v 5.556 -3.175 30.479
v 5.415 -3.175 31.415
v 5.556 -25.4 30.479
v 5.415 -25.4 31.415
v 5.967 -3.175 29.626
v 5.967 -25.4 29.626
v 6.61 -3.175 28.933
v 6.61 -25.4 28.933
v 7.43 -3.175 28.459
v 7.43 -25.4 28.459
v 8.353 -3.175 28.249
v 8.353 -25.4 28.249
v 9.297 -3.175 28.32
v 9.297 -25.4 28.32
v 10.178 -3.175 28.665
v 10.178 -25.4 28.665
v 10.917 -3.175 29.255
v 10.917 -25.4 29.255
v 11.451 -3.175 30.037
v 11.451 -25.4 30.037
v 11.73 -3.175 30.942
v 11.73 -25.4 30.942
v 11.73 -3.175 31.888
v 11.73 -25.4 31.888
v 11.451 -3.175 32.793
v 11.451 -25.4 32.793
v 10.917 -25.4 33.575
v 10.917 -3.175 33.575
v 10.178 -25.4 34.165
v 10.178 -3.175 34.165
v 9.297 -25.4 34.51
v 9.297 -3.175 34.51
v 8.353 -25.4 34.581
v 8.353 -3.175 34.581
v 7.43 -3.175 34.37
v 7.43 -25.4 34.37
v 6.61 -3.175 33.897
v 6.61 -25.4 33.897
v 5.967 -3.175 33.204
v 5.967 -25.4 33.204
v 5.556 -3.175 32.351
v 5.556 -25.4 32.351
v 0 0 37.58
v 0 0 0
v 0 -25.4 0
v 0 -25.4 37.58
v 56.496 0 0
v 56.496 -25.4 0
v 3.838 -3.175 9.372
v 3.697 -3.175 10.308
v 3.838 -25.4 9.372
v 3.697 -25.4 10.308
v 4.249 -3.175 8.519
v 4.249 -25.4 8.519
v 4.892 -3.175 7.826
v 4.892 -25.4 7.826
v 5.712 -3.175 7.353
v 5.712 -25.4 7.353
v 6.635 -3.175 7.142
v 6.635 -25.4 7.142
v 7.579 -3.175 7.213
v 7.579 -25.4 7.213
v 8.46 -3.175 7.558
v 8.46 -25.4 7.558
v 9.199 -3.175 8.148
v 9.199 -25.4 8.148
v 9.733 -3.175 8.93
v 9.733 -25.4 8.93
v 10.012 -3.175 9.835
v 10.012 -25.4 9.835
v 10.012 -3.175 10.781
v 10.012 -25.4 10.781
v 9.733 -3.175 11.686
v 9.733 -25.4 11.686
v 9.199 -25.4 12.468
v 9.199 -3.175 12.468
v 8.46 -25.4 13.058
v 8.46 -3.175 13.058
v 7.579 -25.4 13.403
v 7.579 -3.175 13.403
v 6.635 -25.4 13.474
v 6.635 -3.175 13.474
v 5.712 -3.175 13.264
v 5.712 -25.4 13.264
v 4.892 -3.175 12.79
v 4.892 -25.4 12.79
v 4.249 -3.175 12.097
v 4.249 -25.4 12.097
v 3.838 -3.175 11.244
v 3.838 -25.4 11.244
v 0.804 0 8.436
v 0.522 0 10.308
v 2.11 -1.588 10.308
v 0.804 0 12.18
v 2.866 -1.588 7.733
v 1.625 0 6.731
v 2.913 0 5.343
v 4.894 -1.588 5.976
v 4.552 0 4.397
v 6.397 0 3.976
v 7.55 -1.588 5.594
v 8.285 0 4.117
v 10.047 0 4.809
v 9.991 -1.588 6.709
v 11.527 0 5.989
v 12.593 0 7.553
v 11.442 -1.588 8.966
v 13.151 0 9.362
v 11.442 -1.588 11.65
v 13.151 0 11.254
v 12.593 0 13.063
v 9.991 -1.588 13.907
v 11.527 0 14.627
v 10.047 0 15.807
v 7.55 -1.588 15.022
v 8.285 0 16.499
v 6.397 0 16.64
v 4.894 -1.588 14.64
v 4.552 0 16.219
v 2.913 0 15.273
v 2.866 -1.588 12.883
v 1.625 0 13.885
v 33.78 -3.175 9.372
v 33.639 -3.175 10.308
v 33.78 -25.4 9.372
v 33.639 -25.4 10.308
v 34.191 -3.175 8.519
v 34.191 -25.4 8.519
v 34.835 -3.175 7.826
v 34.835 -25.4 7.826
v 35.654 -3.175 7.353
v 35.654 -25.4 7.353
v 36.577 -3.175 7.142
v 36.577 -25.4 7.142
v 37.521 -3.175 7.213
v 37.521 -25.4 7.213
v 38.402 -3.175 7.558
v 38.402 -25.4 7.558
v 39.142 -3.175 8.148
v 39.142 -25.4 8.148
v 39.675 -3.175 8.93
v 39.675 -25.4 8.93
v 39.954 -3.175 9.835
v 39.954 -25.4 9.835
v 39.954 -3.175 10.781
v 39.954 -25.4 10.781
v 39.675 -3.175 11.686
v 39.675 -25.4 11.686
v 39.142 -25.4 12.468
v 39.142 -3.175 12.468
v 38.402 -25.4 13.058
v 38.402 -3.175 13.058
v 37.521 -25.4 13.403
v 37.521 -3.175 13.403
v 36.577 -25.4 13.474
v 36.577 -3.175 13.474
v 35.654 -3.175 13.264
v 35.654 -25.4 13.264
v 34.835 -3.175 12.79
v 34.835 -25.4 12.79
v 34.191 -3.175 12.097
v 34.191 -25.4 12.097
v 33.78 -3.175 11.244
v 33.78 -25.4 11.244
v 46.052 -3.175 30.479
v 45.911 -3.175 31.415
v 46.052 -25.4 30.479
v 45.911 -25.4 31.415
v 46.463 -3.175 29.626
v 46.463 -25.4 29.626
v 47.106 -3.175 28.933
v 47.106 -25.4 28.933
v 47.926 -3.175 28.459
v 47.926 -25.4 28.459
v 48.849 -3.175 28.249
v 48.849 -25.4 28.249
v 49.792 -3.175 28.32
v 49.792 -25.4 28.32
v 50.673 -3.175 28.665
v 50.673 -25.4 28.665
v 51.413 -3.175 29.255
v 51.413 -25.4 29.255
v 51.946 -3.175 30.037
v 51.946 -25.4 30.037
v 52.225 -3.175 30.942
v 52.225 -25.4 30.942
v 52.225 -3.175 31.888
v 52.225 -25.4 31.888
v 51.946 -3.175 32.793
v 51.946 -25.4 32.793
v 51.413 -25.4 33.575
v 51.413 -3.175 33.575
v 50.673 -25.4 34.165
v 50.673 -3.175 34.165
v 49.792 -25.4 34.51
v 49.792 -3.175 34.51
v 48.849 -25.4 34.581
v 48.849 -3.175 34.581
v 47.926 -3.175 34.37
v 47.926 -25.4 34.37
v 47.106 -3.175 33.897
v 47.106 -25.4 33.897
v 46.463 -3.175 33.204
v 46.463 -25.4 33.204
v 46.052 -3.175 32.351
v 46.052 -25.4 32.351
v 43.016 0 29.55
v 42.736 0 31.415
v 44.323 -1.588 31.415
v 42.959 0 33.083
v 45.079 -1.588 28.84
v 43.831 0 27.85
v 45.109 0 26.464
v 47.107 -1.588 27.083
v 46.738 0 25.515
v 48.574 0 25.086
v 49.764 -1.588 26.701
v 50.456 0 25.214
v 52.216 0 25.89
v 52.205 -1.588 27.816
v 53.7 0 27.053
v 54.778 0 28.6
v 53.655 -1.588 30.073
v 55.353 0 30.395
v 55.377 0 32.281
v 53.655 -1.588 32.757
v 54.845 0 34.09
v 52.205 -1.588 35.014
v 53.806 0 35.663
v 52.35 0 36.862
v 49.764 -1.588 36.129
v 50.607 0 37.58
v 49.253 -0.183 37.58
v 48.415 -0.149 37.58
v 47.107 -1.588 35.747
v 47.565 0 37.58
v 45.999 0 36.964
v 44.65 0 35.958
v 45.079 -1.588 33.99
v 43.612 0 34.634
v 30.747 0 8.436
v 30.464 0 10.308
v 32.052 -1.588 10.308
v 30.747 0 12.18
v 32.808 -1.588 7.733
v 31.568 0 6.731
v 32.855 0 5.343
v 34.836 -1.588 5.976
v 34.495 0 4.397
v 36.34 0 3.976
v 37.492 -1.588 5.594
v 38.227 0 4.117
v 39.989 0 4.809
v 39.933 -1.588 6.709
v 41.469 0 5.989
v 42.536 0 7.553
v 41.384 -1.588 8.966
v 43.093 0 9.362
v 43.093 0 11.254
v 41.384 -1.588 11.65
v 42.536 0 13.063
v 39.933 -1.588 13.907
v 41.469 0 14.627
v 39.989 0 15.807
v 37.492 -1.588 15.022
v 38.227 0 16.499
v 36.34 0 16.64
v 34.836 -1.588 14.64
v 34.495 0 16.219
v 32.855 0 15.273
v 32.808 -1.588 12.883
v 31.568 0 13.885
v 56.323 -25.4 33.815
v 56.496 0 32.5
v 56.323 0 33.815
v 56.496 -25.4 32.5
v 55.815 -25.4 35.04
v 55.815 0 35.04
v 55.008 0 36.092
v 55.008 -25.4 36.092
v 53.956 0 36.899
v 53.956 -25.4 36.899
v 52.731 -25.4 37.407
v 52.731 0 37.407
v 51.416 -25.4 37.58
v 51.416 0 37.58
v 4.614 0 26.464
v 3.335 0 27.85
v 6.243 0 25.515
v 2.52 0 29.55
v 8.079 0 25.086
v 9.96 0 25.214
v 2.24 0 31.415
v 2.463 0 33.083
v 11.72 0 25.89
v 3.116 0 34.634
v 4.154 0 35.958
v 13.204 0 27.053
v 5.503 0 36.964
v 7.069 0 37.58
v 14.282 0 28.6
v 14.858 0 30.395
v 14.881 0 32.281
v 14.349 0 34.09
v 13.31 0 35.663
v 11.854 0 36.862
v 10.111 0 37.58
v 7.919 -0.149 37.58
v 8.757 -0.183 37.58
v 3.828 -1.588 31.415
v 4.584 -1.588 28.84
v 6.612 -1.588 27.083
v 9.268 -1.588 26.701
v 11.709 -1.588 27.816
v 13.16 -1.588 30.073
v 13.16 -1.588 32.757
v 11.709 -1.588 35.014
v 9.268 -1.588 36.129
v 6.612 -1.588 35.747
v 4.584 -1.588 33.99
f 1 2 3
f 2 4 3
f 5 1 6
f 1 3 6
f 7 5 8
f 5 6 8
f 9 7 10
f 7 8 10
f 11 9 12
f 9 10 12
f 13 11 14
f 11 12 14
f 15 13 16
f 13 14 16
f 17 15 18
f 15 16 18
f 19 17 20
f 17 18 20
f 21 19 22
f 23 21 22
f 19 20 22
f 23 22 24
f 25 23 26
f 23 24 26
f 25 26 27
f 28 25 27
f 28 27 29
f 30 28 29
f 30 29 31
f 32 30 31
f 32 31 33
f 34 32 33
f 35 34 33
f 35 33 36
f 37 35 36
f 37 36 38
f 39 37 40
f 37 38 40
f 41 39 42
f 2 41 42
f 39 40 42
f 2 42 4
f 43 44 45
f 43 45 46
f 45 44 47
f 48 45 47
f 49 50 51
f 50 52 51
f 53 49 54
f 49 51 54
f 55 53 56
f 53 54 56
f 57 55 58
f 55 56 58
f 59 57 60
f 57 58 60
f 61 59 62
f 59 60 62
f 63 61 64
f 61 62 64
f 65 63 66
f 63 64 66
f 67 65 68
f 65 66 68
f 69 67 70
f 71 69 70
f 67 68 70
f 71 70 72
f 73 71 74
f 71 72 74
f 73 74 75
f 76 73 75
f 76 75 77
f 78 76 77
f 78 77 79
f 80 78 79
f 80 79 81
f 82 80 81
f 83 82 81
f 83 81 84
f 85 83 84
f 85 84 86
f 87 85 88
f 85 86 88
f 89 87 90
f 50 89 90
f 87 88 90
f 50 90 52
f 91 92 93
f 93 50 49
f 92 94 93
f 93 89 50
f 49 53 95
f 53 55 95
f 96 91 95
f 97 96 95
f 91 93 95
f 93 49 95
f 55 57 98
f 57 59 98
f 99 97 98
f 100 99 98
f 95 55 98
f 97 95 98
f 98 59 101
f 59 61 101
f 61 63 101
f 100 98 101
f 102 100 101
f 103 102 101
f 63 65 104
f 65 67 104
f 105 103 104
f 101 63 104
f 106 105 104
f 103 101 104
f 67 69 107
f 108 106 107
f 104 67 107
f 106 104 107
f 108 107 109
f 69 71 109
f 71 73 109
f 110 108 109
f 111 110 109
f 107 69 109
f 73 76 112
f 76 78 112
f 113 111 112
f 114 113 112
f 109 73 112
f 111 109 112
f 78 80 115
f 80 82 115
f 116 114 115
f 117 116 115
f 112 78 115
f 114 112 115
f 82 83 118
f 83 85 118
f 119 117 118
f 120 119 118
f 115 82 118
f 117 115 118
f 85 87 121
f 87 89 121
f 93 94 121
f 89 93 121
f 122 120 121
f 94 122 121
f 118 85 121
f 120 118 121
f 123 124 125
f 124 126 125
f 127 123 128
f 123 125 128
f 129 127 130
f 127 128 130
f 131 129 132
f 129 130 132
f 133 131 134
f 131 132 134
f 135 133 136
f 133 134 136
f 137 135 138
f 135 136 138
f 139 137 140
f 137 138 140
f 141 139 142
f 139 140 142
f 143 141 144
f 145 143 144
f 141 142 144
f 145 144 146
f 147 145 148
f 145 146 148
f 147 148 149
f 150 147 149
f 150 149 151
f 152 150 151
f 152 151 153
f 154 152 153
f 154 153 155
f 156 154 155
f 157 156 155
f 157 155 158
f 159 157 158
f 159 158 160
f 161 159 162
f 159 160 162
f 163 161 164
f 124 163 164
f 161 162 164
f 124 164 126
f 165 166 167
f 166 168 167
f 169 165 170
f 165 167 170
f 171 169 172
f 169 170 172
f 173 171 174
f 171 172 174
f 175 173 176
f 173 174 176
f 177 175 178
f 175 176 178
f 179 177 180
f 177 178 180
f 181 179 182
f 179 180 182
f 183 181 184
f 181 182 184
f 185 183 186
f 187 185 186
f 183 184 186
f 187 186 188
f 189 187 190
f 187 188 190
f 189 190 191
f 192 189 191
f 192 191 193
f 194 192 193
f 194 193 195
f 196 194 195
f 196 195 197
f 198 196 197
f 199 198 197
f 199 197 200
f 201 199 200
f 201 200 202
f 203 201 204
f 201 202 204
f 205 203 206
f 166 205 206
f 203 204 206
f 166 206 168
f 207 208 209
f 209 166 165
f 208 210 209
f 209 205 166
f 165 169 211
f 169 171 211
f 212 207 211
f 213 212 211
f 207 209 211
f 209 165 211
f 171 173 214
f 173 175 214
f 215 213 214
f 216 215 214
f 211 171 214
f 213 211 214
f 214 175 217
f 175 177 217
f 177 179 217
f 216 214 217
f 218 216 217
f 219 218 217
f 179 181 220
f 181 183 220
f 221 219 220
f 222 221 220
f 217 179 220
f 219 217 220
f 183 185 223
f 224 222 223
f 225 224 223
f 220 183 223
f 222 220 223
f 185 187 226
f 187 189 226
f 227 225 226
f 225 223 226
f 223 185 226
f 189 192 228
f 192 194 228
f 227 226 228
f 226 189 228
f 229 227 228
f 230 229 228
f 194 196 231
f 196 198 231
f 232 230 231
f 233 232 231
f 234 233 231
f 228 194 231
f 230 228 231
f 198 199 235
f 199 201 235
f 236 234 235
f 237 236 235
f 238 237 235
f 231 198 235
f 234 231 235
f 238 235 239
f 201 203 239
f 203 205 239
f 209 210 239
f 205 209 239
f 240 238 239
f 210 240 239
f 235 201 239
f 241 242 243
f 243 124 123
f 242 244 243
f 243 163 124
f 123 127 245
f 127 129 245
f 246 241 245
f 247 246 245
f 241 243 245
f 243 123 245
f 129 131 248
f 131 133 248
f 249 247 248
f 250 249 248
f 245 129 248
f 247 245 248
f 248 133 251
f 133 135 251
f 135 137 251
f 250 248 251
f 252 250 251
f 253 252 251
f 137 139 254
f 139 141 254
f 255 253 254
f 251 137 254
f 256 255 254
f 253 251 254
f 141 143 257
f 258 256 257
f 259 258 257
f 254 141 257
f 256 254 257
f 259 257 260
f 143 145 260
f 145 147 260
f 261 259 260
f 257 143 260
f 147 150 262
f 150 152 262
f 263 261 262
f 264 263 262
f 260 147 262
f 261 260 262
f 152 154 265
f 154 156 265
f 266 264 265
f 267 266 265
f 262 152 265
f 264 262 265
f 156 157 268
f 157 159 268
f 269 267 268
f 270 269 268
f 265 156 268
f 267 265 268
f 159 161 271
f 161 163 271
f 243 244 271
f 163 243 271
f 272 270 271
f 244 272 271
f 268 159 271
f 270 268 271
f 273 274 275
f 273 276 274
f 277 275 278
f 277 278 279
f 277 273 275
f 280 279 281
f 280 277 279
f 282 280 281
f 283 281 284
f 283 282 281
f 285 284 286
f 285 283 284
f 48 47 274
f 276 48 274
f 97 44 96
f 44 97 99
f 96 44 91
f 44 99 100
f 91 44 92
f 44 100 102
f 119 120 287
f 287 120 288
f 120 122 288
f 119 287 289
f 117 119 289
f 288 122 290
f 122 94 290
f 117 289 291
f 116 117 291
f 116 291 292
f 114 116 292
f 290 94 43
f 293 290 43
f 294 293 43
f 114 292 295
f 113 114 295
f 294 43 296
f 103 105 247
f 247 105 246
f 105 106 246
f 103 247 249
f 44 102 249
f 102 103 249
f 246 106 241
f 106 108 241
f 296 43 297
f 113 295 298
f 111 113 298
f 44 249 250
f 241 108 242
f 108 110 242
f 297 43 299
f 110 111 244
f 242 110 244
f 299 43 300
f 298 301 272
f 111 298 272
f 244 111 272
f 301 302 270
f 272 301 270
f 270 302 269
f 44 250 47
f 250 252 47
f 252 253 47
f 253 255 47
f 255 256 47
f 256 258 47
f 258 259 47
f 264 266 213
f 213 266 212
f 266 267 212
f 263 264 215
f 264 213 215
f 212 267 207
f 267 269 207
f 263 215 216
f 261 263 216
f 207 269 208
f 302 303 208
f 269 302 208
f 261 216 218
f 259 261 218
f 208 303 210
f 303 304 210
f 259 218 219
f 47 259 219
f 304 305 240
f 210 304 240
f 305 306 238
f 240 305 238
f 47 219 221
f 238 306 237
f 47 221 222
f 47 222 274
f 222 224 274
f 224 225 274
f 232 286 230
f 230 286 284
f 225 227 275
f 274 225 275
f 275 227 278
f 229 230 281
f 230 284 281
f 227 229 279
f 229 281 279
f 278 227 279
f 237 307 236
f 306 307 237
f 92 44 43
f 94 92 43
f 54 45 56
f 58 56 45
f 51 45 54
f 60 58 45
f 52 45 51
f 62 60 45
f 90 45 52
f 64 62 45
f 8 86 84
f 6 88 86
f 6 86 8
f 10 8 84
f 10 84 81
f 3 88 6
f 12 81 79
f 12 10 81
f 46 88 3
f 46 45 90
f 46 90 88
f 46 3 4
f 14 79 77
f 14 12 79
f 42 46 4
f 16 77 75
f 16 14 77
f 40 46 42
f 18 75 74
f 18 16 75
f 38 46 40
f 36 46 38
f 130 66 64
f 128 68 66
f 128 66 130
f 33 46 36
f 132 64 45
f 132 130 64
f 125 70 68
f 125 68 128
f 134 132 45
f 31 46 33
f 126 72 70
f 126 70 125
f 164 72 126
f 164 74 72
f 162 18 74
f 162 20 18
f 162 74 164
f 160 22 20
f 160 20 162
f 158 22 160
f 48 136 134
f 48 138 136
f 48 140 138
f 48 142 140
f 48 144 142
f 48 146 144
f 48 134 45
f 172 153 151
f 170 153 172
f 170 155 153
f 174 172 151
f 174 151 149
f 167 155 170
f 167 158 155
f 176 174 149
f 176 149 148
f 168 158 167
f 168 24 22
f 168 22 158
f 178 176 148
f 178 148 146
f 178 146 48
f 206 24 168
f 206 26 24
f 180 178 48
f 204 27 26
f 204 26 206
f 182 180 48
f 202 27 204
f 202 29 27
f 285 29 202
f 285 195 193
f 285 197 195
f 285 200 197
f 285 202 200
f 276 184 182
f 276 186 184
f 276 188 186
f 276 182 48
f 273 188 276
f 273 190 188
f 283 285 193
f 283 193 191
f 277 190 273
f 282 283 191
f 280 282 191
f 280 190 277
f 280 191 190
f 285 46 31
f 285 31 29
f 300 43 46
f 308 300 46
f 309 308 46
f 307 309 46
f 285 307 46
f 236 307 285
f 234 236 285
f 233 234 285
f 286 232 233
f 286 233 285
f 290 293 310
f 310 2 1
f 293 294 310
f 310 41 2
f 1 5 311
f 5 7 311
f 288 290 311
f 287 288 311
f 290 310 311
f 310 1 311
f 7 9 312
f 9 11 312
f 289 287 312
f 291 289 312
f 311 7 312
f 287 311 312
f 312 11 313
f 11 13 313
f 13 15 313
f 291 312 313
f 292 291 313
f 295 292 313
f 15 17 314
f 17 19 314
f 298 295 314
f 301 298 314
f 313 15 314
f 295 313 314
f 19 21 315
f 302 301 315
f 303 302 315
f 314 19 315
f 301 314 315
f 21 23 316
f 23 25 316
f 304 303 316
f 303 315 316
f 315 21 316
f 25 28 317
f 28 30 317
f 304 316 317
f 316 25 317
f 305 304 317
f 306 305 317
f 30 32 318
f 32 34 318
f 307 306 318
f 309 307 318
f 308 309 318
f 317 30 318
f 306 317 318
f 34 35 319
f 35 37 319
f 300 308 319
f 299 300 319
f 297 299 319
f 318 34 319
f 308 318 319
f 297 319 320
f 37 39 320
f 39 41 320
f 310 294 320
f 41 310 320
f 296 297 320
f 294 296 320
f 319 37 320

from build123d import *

# Parameters (mm, degrees)
F0_W           = 56.4960166812
F0_H           = 37.580087781
F1_DEPTH       = 25.4
F2_R           = 5.08
F4_D           = 6.35
F4_CSINK_D     = 12.7
F4_CSINK_ANGLE = 90


with BuildPart() as f1:
    # F0 (on Front) → F1 (new body)
    with BuildSketch(Plane.XZ):
        with Locations((28.2480083406, 18.7900438905)):
            Rectangle(F0_W, F0_H)
    extrude(amount=F1_DEPTH)

    # F2
    f2_edges = [f1.edges().sort_by_distance(p)[0] for p in [
        (56.496017, -12.7, 37.580088),
    ]]
    fillet(f2_edges, radius=F2_R)

    # F4 (through all)
    with Locations(Plane(origin=(0, 0, 0), x_dir=(1, 0, 0), z_dir=(0, 1, 0))):
        with Locations((8.5900304839, -31.4149707556), (6.8720257841, -10.3080365807), (36.81441769, -10.3080365807), (49.0858890116, -31.4149707556)):
            CounterSinkHole(F4_D / 2, F4_CSINK_D / 2, counter_sink_angle=F4_CSINK_ANGLE)


solid = f1.part
